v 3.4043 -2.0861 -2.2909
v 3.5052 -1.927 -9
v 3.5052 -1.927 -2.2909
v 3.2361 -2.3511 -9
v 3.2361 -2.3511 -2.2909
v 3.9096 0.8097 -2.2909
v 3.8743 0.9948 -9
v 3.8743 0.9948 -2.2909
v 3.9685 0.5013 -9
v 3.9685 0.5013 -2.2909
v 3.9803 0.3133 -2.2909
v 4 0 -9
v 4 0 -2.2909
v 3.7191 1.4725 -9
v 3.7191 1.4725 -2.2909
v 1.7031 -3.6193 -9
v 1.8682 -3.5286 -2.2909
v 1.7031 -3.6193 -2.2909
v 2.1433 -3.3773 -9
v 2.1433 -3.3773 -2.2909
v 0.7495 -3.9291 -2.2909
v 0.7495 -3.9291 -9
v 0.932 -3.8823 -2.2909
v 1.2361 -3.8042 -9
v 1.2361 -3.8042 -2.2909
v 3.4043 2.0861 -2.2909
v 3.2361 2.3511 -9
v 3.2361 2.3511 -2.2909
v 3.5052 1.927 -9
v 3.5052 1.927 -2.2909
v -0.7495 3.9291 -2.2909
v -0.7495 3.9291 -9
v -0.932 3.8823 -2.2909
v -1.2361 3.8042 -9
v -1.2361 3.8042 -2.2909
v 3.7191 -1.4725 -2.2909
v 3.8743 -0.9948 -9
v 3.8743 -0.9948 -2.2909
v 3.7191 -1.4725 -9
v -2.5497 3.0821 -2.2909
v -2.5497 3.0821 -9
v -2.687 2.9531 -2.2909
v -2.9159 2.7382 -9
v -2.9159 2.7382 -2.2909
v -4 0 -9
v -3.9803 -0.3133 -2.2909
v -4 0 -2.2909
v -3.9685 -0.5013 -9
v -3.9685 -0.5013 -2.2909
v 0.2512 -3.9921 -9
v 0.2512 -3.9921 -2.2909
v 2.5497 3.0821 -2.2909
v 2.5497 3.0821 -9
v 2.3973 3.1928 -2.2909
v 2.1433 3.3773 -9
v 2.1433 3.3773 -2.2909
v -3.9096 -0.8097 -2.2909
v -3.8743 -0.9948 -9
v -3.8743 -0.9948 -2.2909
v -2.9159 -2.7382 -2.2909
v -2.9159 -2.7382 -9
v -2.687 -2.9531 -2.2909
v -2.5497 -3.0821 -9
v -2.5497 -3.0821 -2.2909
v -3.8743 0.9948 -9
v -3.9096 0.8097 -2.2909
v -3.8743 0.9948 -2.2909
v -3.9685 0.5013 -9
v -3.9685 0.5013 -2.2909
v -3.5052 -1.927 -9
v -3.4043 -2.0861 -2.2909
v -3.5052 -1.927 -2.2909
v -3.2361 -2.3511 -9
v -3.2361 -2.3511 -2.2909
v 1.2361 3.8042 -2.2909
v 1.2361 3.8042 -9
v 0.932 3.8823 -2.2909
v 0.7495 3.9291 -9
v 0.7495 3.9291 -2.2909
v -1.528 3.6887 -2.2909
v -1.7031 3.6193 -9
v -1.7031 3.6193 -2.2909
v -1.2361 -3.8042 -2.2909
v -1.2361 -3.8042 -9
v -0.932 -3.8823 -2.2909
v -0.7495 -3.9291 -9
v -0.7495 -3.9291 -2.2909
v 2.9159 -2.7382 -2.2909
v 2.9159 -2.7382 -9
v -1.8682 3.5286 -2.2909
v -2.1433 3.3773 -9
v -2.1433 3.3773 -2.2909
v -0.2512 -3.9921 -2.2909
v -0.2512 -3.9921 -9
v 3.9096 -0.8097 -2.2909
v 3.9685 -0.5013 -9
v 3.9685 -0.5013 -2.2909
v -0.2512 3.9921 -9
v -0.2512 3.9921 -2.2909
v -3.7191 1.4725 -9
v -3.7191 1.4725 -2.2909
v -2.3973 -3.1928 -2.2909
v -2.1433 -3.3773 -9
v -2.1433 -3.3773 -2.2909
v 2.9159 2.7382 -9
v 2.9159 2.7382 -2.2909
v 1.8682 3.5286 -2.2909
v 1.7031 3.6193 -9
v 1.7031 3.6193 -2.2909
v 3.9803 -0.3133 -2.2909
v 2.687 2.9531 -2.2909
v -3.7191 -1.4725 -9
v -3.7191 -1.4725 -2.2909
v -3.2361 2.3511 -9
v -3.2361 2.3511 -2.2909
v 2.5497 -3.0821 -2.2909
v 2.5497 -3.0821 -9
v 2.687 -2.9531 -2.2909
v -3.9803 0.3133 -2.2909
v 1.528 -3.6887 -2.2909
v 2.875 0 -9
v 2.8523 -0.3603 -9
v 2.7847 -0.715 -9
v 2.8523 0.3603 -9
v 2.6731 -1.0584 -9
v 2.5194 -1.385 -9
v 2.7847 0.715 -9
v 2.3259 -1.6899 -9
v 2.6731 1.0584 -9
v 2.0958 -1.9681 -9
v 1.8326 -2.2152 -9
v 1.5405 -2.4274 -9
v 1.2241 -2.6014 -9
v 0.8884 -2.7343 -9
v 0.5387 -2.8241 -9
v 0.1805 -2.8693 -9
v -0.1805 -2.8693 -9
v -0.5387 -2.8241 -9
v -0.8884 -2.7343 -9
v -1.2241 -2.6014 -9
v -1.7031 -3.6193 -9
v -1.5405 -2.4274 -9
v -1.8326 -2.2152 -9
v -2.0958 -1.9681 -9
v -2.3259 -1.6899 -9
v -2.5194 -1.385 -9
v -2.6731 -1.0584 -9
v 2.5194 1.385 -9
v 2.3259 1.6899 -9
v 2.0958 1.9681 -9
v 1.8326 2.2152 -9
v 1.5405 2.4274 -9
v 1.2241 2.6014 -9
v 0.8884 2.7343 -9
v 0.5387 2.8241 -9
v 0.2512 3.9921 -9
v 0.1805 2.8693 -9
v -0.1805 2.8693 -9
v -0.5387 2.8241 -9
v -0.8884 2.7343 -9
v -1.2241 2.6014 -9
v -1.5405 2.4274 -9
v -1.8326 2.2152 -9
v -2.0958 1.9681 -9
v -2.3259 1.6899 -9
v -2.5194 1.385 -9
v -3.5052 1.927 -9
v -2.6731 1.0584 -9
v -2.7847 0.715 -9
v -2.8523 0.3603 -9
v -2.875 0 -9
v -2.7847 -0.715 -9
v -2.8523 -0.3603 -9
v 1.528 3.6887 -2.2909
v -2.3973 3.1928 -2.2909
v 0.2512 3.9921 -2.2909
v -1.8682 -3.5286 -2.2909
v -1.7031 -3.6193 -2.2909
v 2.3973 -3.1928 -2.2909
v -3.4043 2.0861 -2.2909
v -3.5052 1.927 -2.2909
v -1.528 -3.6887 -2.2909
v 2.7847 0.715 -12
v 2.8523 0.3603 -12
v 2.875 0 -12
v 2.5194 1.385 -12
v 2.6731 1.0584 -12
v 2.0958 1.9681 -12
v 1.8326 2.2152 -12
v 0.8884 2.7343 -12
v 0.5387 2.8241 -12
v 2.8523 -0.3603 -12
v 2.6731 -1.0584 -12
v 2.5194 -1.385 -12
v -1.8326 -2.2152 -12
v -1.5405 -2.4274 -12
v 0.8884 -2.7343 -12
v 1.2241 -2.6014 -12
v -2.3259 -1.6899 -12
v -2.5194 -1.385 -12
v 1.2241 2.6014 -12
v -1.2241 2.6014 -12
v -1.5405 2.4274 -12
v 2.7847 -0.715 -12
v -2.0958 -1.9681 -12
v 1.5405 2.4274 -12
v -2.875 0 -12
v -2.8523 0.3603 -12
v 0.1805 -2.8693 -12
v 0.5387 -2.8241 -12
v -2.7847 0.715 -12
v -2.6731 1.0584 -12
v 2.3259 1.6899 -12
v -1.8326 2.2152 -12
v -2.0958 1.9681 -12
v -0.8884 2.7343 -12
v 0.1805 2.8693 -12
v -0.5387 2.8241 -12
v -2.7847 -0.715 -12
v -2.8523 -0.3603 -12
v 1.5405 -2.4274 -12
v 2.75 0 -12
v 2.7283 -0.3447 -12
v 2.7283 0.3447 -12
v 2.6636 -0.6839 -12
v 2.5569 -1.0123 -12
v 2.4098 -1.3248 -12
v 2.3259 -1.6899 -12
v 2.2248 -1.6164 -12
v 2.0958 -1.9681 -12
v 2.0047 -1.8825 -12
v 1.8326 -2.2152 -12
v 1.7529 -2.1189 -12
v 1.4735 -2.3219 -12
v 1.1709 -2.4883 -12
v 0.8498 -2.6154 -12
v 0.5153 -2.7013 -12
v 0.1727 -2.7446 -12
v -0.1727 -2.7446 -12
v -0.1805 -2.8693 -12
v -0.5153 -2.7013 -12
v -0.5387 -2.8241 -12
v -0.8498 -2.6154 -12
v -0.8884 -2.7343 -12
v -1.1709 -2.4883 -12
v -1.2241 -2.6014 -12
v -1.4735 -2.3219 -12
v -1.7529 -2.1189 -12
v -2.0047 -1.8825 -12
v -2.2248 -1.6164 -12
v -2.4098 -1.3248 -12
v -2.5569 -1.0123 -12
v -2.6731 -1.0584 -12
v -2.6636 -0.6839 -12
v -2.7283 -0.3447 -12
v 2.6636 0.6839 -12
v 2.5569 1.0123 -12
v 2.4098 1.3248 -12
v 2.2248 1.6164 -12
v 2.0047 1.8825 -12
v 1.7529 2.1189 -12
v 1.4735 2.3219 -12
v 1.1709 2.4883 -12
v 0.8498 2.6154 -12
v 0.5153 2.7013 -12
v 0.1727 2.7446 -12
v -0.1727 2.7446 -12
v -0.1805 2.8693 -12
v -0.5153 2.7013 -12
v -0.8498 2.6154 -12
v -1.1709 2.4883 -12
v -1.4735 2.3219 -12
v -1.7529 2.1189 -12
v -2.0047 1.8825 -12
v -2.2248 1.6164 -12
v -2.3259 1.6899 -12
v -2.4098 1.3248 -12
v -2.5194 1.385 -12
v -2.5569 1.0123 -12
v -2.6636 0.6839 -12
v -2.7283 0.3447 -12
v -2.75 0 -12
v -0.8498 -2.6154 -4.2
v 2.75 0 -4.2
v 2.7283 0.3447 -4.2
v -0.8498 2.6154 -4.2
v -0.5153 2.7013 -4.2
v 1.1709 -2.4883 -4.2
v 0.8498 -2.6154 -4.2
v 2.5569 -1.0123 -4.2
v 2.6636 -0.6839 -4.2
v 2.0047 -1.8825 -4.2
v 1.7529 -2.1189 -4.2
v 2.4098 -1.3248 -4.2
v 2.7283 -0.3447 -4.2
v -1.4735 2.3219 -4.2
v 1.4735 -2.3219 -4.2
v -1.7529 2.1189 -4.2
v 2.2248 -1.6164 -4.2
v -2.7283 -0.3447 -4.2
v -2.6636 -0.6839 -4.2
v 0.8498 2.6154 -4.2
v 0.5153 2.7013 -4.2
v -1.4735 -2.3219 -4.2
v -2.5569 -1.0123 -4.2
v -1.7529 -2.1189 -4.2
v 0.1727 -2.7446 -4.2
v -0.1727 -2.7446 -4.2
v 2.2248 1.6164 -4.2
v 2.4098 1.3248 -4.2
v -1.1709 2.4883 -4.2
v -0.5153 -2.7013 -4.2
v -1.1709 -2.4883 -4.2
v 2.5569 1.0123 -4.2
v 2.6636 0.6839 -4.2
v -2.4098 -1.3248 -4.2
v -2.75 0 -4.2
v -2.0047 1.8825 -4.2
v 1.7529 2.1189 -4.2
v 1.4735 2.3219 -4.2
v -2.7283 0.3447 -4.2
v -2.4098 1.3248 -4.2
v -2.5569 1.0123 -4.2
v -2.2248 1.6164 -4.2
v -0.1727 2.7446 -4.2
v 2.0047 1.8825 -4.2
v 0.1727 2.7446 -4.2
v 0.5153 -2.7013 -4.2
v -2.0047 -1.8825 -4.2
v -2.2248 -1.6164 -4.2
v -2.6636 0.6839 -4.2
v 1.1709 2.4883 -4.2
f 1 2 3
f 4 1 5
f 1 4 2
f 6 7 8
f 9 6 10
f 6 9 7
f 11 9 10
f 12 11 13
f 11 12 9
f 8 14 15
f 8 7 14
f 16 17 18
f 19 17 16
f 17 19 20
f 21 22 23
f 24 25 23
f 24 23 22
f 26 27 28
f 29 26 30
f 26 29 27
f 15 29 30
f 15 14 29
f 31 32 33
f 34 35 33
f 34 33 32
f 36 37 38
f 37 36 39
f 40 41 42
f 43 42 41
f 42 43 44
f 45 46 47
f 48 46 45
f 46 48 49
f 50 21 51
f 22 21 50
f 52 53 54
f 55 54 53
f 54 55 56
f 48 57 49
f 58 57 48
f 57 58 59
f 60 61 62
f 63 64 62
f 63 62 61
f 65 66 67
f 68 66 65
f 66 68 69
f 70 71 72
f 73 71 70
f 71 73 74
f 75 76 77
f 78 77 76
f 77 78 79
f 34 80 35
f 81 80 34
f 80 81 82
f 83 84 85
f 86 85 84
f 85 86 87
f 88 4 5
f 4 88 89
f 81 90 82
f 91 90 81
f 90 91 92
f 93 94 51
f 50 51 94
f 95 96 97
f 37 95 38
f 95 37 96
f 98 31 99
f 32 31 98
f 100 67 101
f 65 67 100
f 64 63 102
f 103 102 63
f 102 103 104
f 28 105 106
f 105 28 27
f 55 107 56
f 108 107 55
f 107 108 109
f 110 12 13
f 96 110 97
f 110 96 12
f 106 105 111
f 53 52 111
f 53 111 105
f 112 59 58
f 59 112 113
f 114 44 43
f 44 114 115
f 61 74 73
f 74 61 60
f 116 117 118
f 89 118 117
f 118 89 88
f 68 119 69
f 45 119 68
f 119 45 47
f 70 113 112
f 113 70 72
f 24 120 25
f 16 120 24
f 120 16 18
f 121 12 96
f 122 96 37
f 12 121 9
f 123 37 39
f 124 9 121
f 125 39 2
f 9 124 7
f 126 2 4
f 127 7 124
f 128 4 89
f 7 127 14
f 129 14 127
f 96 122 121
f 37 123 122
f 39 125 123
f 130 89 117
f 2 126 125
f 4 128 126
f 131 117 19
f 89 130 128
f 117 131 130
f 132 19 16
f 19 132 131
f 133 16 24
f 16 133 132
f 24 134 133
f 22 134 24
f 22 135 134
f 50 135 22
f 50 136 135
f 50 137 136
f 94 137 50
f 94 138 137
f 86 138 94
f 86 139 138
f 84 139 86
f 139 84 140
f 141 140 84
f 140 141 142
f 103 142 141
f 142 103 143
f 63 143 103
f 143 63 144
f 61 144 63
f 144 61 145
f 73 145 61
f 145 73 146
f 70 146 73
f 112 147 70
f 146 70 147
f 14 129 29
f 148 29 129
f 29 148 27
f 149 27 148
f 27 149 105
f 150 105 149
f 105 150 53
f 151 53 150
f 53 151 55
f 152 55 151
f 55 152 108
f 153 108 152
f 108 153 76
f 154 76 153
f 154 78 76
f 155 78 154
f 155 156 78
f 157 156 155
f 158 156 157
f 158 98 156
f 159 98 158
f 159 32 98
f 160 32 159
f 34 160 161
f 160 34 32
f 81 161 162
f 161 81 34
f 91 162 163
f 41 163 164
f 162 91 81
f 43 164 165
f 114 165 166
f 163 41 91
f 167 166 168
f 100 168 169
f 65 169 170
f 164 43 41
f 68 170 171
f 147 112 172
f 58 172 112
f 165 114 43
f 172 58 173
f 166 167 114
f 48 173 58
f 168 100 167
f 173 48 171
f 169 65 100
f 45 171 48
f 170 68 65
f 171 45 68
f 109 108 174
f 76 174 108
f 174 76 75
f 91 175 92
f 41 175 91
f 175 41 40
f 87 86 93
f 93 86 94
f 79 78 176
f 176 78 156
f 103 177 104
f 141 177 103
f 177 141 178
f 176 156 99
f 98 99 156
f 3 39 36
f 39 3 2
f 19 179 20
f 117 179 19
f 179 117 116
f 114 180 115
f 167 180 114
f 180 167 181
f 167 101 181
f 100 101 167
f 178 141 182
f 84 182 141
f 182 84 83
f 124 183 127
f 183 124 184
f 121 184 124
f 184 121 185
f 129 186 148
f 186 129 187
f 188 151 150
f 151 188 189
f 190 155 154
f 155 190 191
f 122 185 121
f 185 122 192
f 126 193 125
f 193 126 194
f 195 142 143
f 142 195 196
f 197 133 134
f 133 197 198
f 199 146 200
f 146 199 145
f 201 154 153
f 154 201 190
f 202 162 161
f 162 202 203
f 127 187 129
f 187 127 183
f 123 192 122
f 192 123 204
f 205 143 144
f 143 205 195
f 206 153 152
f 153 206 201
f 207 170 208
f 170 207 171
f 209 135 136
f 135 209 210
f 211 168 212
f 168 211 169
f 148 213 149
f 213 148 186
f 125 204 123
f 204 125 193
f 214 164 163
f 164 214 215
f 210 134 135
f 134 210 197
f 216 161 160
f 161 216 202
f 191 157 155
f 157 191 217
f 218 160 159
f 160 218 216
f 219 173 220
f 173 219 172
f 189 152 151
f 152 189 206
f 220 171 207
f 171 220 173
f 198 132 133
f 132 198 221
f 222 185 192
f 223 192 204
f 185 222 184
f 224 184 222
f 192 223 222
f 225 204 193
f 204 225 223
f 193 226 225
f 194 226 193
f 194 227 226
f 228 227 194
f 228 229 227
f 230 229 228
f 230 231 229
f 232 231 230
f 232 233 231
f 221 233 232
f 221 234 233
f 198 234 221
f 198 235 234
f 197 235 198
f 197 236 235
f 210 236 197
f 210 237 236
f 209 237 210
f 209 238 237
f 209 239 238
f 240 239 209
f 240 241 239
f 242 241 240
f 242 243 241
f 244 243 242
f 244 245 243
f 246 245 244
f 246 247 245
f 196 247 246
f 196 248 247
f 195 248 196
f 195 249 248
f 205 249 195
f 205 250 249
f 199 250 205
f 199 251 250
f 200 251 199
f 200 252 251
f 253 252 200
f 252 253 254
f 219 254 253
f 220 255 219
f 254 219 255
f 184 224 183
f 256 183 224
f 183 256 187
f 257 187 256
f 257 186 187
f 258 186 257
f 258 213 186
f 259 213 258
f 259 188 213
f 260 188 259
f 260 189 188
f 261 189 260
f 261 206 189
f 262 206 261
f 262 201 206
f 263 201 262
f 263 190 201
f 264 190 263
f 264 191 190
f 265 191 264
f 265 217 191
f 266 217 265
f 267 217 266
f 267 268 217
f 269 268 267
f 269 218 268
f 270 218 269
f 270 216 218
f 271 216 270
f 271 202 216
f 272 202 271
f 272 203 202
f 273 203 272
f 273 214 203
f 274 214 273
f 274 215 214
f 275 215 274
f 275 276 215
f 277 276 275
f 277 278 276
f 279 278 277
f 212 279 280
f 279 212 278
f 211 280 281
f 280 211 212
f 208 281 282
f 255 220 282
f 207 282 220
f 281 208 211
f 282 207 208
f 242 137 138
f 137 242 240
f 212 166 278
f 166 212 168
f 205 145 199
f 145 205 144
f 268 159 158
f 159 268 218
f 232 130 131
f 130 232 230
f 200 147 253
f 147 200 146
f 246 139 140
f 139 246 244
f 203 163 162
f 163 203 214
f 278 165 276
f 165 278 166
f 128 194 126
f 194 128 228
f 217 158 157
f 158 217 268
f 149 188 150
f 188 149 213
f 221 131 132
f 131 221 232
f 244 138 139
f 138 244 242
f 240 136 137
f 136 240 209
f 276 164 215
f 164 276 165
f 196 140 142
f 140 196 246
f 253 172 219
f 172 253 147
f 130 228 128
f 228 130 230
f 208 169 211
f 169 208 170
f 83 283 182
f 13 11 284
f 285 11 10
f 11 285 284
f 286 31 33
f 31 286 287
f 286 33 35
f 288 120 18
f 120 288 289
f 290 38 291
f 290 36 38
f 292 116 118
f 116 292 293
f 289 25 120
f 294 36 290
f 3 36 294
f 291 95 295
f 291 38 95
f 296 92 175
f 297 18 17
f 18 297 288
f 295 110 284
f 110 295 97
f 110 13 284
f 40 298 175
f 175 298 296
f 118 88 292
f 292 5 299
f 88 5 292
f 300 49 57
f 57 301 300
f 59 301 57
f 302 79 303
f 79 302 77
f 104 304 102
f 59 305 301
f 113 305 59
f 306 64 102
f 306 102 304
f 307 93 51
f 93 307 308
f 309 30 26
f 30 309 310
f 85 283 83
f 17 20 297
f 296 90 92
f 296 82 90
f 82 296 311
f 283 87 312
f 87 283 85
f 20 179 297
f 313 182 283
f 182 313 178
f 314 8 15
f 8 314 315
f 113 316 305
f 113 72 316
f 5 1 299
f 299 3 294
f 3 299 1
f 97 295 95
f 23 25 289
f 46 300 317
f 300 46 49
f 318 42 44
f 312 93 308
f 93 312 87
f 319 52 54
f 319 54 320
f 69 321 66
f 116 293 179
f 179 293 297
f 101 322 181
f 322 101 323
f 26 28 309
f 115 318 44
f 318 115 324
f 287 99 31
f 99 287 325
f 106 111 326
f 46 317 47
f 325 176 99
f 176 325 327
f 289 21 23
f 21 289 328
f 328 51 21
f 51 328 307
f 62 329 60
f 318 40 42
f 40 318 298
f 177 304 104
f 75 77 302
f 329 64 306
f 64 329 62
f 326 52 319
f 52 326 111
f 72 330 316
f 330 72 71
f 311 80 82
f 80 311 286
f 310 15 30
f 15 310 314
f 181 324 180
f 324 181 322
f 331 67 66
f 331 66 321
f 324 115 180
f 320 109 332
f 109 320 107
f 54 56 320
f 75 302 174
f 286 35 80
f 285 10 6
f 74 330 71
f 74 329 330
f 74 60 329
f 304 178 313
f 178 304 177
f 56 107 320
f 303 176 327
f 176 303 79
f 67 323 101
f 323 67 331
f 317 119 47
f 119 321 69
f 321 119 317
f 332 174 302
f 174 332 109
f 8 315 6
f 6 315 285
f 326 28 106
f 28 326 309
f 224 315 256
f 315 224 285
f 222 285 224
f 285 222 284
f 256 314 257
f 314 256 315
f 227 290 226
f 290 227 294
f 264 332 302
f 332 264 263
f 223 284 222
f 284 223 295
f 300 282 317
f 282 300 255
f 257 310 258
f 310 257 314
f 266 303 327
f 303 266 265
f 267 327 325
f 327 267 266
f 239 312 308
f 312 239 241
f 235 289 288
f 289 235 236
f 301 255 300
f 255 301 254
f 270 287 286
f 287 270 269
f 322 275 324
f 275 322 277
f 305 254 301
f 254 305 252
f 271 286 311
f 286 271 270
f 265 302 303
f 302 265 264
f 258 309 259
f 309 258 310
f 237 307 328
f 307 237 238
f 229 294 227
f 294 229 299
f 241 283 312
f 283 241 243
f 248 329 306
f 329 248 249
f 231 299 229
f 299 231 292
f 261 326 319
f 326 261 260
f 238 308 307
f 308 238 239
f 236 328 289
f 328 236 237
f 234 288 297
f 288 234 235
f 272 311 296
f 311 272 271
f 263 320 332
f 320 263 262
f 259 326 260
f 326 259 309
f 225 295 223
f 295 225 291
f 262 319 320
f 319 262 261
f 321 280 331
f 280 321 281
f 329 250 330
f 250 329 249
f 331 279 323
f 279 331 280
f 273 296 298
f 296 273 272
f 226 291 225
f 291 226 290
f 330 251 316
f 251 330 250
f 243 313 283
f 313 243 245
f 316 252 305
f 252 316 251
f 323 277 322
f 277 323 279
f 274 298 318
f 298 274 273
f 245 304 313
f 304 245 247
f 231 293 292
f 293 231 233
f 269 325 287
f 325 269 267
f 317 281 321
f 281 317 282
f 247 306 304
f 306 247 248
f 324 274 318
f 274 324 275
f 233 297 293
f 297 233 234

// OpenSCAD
$fn = 50;

difference() {
	union() {
		translate(v = [0, 0, -9.0]) {
			cylinder(h = 12, r = 4.0);
		}
		#translate(v = [0, 0, -12.0]) {
			cylinder(h = 12, r = 2.875);
		}
	}
	union() {
		translate(v = [0, 0, 0]) {
			rotate(a = [0, 0, 0]) {
				difference() {
					union() {
						translate(v = [0, 0, -12.0]) {
							cylinder(h = 12, r = 2.25);
						}
						translate(v = [0, 0, -4.2]) {
							cylinder(h = 4.2, r1 = 2.75, r2 = 5.5);
						}
						translate(v = [0, 0, -12.0]) {
							cylinder(h = 12, r = 2.75);
						}
						translate(v = [0, 0, -12.0]) {
							cylinder(h = 12, r = 2.25);
						}
					}
					union();
				}
			}
		}
		#cylinder(h = 3, r = 6.25);
	}
}
